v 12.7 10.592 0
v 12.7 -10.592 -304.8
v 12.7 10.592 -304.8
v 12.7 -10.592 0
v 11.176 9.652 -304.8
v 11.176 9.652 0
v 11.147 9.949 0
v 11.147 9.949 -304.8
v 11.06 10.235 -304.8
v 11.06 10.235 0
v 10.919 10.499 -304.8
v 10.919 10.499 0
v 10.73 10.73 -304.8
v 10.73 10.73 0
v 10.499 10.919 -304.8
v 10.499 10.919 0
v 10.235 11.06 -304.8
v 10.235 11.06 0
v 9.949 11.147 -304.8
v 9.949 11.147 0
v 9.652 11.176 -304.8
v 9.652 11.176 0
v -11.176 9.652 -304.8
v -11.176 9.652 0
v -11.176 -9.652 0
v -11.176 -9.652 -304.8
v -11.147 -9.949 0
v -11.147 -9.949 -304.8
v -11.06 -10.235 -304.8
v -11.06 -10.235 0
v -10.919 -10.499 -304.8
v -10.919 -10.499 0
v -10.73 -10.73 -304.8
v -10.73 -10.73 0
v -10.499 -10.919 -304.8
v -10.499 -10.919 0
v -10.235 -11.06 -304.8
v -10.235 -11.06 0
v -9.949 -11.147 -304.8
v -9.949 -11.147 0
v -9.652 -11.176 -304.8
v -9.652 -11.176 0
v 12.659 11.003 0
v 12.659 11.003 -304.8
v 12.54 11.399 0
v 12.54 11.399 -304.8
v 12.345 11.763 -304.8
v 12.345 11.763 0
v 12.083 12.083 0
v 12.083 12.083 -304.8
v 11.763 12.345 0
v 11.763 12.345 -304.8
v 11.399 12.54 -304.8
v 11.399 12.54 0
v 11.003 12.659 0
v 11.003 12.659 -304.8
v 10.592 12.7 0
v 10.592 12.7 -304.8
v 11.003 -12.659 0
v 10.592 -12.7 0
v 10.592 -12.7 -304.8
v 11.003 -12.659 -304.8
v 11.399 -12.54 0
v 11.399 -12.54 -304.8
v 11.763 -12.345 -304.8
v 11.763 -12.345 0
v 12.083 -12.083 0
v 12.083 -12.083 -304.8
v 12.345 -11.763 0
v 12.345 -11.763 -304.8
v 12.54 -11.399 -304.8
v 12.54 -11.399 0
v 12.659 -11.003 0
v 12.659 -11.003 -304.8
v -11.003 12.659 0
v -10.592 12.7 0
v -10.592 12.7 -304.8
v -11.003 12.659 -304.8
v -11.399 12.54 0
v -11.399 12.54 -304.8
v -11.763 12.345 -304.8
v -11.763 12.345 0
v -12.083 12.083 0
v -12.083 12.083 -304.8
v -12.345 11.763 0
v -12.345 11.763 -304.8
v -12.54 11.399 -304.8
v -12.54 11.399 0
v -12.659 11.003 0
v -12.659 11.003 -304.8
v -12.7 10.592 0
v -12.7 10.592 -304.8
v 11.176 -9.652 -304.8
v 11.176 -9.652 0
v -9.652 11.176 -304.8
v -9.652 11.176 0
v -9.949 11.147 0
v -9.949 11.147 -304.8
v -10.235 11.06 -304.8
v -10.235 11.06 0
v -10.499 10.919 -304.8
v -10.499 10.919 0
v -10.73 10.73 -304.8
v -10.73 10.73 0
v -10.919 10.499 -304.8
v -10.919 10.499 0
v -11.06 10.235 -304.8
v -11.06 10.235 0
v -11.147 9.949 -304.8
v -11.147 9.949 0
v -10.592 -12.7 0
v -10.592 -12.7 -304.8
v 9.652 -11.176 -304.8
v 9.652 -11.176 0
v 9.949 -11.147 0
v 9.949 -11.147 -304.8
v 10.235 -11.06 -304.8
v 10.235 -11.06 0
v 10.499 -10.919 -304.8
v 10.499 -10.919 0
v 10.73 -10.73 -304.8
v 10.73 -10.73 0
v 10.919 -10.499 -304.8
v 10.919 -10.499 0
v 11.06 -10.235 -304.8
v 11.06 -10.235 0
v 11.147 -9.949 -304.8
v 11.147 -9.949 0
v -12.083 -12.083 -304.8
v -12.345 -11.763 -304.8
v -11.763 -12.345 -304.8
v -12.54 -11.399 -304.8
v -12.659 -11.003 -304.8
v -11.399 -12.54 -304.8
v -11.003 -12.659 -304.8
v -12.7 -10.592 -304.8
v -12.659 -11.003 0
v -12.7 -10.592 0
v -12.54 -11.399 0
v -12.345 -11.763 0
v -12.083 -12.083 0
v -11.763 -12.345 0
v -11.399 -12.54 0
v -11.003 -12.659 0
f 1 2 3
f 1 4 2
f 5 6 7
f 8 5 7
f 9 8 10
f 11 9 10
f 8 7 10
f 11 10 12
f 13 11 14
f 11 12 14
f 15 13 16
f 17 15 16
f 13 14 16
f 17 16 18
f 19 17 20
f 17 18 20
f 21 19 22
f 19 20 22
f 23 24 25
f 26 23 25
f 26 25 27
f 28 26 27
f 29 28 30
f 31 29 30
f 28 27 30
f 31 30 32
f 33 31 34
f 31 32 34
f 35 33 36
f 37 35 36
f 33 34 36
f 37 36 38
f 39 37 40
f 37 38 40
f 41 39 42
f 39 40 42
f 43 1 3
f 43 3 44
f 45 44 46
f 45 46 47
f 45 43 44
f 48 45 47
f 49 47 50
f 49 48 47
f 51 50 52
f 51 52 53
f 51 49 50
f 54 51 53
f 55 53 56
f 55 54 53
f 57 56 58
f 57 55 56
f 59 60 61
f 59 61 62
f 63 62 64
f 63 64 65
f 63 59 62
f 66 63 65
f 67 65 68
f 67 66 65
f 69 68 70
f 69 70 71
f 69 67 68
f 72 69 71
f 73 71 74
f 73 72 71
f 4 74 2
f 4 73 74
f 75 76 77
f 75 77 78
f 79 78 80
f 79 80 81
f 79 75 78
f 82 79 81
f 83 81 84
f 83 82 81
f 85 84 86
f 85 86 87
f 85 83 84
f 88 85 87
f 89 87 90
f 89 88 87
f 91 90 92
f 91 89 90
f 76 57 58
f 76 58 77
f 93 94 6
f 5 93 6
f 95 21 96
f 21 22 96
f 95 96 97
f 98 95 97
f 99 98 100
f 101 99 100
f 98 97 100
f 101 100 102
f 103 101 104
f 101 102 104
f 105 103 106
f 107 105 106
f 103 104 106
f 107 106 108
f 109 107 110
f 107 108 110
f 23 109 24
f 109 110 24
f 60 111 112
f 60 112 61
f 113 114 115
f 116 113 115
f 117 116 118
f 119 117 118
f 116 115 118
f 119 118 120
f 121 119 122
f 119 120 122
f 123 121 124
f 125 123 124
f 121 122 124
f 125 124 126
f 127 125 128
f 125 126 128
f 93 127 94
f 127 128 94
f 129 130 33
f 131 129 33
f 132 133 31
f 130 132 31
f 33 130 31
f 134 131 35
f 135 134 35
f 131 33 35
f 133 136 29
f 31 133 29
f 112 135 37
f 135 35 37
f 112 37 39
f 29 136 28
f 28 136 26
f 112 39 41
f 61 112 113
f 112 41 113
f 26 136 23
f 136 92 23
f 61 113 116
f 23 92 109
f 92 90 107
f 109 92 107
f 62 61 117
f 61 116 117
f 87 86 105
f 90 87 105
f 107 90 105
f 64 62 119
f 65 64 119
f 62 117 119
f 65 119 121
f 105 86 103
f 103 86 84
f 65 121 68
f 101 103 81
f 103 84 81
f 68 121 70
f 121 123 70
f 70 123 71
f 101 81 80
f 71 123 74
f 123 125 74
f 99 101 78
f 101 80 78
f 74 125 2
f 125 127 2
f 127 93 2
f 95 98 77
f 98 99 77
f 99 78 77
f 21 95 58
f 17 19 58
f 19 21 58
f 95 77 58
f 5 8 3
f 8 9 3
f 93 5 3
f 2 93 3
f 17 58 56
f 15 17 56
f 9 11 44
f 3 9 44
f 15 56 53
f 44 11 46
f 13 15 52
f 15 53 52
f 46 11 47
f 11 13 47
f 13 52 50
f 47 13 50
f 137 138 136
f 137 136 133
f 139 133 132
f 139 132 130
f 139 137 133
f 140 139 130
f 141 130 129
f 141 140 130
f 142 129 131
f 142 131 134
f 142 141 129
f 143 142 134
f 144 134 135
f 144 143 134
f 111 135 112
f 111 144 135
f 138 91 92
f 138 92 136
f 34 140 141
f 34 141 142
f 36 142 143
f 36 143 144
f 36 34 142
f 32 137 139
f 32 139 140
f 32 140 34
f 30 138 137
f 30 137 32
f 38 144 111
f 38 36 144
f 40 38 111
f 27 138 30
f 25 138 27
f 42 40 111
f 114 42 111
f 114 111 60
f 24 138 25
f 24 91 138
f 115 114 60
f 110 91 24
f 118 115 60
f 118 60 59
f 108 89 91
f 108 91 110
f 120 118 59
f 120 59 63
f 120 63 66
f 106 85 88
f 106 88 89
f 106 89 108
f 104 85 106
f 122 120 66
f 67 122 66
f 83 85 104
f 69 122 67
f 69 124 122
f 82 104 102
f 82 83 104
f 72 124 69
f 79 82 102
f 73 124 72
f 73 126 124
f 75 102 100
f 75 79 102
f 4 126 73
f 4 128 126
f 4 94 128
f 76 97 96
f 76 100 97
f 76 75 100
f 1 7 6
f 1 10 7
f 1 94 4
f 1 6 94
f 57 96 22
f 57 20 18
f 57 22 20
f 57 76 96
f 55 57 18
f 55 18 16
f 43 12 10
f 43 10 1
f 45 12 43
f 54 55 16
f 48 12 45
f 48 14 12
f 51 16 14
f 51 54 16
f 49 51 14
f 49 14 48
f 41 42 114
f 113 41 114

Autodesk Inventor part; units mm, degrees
ref_plane "YZ Plane" through (0, 0, 0) normal (1, 0, 0) x (0, 1, 0)
ref_plane "XZ Plane" through (0, 0, 0) normal (0, 1, 0) x (-1, 0, 0)
ref_plane "XY Plane" through (0, 0, 0) normal (0, 0, 1) x (1, 0, 0)
sketch "Sketch1" plane through (0, 0, 0) normal (0, 0, 1) x (1, 0, 0)
  arc A0 (11.176, 9.652) -> (9.652, 11.176) centre (9.652, 9.652) ccw
  line L0 (11.176, -9.652) -> (11.176, 9.652)
  arc A1 (9.652, -11.176) -> (11.176, -9.652) centre (9.652, -9.652) ccw
  line L1 (-9.652, -11.176) -> (9.652, -11.176)
  arc A2 (-11.176, -9.652) -> (-9.652, -11.176) centre (-9.652, -9.652) ccw
  line L2 (-11.176, 9.652) -> (-11.176, -9.652)
  arc A3 (-9.652, 11.176) -> (-11.176, 9.652) centre (-9.652, 9.652) ccw
  line L3 (9.652, 11.176) -> (-9.652, 11.176)
  arc A4 (-12.7, -10.5918) -> (-10.5918, -12.7) centre (-10.5918, -10.5918) ccw
  line L4 (-10.5918, -12.7) -> (10.5918, -12.7)
  arc A5 (10.5918, -12.7) -> (12.7, -10.5918) centre (10.5918, -10.5918) ccw
  line L5 (12.7, -10.5918) -> (12.7, 10.5918)
  arc A6 (12.7, 10.5918) -> (10.5918, 12.7) centre (10.5918, 10.5918) ccw
  line L6 (10.5918, 12.7) -> (-10.5918, 12.7)
  arc A7 (-10.5918, 12.7) -> (-12.7, 10.5918) centre (-10.5918, 10.5918) ccw
  line L7 (-12.7, 10.5918) -> (-12.7, -10.5918)
  point P0 (0, 0)
extrude "Extrusion1" add sketch "Sketch1" against normal blind 304.8
properties part number "9000"
